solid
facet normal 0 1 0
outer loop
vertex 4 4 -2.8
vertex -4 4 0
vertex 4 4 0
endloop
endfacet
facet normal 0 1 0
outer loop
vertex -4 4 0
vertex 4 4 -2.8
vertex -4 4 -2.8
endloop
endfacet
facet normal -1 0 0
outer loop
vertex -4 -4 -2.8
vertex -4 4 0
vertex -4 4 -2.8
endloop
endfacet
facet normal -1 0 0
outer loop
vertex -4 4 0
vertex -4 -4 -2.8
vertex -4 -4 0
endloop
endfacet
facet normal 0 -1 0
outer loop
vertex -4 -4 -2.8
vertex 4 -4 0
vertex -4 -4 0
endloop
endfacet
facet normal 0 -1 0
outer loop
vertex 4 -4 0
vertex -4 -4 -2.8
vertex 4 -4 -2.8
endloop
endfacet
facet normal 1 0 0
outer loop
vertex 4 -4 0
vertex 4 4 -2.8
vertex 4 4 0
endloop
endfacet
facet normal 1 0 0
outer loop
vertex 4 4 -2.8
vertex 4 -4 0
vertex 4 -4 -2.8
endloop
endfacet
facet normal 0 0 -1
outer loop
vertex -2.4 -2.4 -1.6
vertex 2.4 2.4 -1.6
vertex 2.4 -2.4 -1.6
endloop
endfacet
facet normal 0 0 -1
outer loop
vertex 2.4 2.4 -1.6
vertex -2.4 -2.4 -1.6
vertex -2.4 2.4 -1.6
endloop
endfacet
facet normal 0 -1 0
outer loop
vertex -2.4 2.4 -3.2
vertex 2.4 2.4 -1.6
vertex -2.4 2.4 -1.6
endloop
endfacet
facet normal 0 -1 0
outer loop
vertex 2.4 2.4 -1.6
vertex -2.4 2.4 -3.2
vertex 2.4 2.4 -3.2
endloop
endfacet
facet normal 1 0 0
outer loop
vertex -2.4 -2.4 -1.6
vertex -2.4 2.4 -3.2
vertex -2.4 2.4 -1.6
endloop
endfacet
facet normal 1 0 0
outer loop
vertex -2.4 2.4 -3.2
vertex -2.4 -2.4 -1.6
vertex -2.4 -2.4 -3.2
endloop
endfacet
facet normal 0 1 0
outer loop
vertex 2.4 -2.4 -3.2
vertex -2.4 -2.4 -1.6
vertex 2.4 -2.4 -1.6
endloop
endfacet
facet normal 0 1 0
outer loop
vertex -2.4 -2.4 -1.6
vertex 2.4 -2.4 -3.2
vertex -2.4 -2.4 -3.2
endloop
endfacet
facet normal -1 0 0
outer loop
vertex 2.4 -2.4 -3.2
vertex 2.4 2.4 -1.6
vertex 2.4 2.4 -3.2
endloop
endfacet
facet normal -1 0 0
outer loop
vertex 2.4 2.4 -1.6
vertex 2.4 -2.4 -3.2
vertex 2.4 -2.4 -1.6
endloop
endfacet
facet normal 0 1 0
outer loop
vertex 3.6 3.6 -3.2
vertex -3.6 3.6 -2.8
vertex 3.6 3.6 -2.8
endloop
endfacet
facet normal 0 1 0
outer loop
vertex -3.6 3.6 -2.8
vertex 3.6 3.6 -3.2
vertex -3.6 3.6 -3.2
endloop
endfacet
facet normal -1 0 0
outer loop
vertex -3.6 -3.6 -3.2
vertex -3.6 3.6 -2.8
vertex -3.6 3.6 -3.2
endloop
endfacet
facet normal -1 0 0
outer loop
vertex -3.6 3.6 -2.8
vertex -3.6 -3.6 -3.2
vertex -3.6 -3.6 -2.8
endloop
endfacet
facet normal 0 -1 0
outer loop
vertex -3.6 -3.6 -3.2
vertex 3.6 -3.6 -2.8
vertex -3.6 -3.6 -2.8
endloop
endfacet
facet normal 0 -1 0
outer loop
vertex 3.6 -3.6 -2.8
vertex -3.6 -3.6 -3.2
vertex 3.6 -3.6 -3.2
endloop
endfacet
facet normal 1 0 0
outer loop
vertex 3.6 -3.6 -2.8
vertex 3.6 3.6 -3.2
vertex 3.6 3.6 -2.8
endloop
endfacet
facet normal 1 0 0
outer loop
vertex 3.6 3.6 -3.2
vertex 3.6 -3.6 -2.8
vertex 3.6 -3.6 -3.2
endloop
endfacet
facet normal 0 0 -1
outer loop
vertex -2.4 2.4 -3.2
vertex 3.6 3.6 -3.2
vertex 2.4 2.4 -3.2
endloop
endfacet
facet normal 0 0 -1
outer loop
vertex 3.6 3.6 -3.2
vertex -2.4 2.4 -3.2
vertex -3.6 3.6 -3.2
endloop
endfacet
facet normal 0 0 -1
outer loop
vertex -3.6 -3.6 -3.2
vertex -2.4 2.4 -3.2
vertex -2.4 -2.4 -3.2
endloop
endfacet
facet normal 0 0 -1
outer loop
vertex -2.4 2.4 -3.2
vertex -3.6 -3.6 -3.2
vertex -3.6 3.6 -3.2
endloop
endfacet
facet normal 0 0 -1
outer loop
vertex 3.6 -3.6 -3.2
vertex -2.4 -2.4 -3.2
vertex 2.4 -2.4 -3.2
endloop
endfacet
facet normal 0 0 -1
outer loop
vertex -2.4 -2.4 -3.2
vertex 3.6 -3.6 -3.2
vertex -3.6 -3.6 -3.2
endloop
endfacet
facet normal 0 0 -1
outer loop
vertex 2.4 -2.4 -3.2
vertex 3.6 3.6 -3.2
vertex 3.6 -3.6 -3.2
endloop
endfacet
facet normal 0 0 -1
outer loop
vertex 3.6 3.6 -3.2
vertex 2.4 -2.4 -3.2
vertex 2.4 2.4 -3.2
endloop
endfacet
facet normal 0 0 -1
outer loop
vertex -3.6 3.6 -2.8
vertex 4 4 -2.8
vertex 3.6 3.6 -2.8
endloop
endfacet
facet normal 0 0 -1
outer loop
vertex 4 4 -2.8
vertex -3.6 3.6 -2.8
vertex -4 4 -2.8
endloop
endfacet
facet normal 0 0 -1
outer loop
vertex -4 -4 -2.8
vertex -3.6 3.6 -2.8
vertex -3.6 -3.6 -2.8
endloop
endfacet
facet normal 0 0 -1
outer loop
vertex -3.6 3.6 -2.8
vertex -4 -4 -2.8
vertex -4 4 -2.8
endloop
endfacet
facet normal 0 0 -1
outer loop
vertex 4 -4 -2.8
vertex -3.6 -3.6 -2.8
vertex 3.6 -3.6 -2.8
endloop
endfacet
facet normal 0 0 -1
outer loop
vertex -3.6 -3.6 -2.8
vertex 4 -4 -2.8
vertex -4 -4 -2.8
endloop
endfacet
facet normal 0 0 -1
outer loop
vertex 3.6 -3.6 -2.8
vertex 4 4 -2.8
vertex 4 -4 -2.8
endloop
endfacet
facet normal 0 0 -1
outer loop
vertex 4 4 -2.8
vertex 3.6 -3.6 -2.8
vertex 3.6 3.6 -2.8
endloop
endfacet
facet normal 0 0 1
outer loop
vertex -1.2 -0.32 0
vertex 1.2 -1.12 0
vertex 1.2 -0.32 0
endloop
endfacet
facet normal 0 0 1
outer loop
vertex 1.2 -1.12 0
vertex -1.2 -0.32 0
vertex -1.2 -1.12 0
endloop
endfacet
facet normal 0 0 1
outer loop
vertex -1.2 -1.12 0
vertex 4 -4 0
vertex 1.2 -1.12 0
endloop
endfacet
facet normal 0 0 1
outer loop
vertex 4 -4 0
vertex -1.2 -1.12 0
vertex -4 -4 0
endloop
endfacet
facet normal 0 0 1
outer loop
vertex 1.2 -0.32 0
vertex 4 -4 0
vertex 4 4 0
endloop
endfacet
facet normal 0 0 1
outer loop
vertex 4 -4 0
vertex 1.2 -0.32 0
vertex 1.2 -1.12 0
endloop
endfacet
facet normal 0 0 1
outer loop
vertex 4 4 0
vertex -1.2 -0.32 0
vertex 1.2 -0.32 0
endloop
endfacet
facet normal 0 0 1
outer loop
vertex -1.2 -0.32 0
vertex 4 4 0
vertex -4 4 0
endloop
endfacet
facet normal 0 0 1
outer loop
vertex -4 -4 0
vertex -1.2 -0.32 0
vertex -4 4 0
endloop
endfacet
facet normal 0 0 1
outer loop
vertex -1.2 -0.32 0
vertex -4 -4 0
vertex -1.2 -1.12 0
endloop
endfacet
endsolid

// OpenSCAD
// file: ../p/box5.scad
use <../lib.scad>
function ldraw_lib__box5() = [
// 0 Box with 5 Faces and All Edges
// 0 Name: box5.dat
// 0 Author: James Jessiman
// 0 !LDRAW_ORG Primitive UPDATE 2012-01
// 0 !LICENSE Licensed under CC BY 2.0 and CC BY 4.0 : see CAreadme.txt
// 
// 0 BFC CERTIFY CCW
  [0,"BFC","CERTIFY"],
  [0,"BFC","CCW"],
// 
// 0 !HISTORY 2002-04-03 [sbliss] Modified for BFC compliance
// 0 !HISTORY 2002-04-25 [PTadmin] Official Update 2002-02
// 0 !HISTORY 2007-06-24 [PTadmin] Header formatted for Contributor Agreement
// 0 !HISTORY 2008-07-01 [PTadmin] Official Update 2008-01
// 0 !HISTORY 2012-02-16 [Philo] Changed to CCW
// 0 !HISTORY 2012-03-30 [PTadmin] Official Update 2012-01
// 
// 
// 2 24 1 1 1 -1 1 1
  [2,24,1,1,1,-1,1,1],
// 2 24 -1 1 1 -1 1 -1
  [2,24,-1,1,1,-1,1,-1],
// 2 24 -1 1 -1 1 1 -1
  [2,24,-1,1,-1,1,1,-1],
// 2 24 1 1 -1 1 1 1
  [2,24,1,1,-1,1,1,1],
// 2 24 1 0 1 -1 0 1
  [2,24,1,0,1,-1,0,1],
// 2 24 -1 0 1 -1 0 -1
  [2,24,-1,0,1,-1,0,-1],
// 2 24 -1 0 -1 1 0 -1
  [2,24,-1,0,-1,1,0,-1],
// 2 24 1 0 -1 1 0 1
  [2,24,1,0,-1,1,0,1],
// 2 24 1 0 1 1 1 1
  [2,24,1,0,1,1,1,1],
// 2 24 -1 0 1 -1 1 1
  [2,24,-1,0,1,-1,1,1],
// 2 24 1 0 -1 1 1 -1
  [2,24,1,0,-1,1,1,-1],
// 2 24 -1 0 -1 -1 1 -1
  [2,24,-1,0,-1,-1,1,-1],
// 4 16 -1 1 1 1 1 1 1 1 -1 -1 1 -1
  [4,16,-1,1,1,1,1,1,1,1,-1,-1,1,-1],
// 4 16 -1 1 1 -1 0 1 1 0 1 1 1 1
  [4,16,-1,1,1,-1,0,1,1,0,1,1,1,1],
// 4 16 -1 1 -1 -1 0 -1 -1 0 1 -1 1 1
  [4,16,-1,1,-1,-1,0,-1,-1,0,1,-1,1,1],
// 4 16 1 1 -1 1 0 -1 -1 0 -1 -1 1 -1
  [4,16,1,1,-1,1,0,-1,-1,0,-1,-1,1,-1],
// 4 16 1 1 1 1 0 1 1 0 -1 1 1 -1
  [4,16,1,1,1,1,0,1,1,0,-1,1,1,-1],
];
makepoly(ldraw_lib__box5(), line=0.2);
// file: ../p/box4.scad
use <../lib.scad>
function ldraw_lib__box4() = [
// 0 Box with 4 Faces (2 Parallel Pairs) and All Edges
// 0 Name: box4.dat
// 0 Author: James Jessiman
// 0 !LDRAW_ORG Primitive UPDATE 2012-01
// 0 !LICENSE Licensed under CC BY 2.0 and CC BY 4.0 : see CAreadme.txt
// 
// 0 BFC CERTIFY CCW
  [0,"BFC","CERTIFY"],
  [0,"BFC","CCW"],
// 
// 0 !HISTORY 2002-04-03 [sbliss] Modified for BFC compliance
// 0 !HISTORY 2002-04-25 [PTadmin] Official Update 2002-02
// 0 !HISTORY 2007-06-24 [PTadmin] Header formatted for Contributor Agreement
// 0 !HISTORY 2008-07-01 [PTadmin] Official Update 2008-01
// 0 !HISTORY 2012-02-16 [Philo] Changed to CCW
// 0 !HISTORY 2012-03-30 [PTadmin] Official Update 2012-01
// 
// 
// 2 24 1 1 1 -1 1 1
  [2,24,1,1,1,-1,1,1],
// 2 24 -1 1 1 -1 1 -1
  [2,24,-1,1,1,-1,1,-1],
// 2 24 -1 1 -1 1 1 -1
  [2,24,-1,1,-1,1,1,-1],
// 2 24 1 1 -1 1 1 1
  [2,24,1,1,-1,1,1,1],
// 2 24 1 0 1 -1 0 1
  [2,24,1,0,1,-1,0,1],
// 2 24 -1 0 1 -1 0 -1
  [2,24,-1,0,1,-1,0,-1],
// 2 24 -1 0 -1 1 0 -1
  [2,24,-1,0,-1,1,0,-1],
// 2 24 1 0 -1 1 0 1
  [2,24,1,0,-1,1,0,1],
// 2 24 1 0 1 1 1 1
  [2,24,1,0,1,1,1,1],
// 2 24 -1 0 1 -1 1 1
  [2,24,-1,0,1,-1,1,1],
// 2 24 1 0 -1 1 1 -1
  [2,24,1,0,-1,1,1,-1],
// 2 24 -1 0 -1 -1 1 -1
  [2,24,-1,0,-1,-1,1,-1],
// 4 16 -1 1 1 -1 0 1 1 0 1 1 1 1
  [4,16,-1,1,1,-1,0,1,1,0,1,1,1,1],
// 4 16 -1 1 -1 -1 0 -1 -1 0 1 -1 1 1
  [4,16,-1,1,-1,-1,0,-1,-1,0,1,-1,1,1],
// 4 16 1 1 -1 1 0 -1 -1 0 -1 -1 1 -1
  [4,16,1,1,-1,1,0,-1,-1,0,-1,-1,1,-1],
// 4 16 1 1 1 1 0 1 1 0 -1 1 1 -1
  [4,16,1,1,1,1,0,1,1,0,-1,1,1,-1],
];
makepoly(ldraw_lib__box4(), line=0.2);
// file: s/3070bs01.scad
use <../../lib.scad>
use <../../p/box4.scad>
use <../../p/box5.scad>
function ldraw_lib__s__3070bs01() = [
// 0 ~Tile  1 x  1 with Groove without Top Face
// 0 Name: s\3070bs01.dat
// 0 Author: Chris Dee [cwdee]
// 0 !LDRAW_ORG Subpart UPDATE 2009-02
// 0 !LICENSE Licensed under CC BY 2.0 and CC BY 4.0 : see CAreadme.txt
// 
// 0 BFC CERTIFY CCW
  [0,"BFC","CERTIFY"],
  [0,"BFC","CCW"],
// 
// 0 !HISTORY 2009-09-03 [PTadmin] Official Update 2009-02
// 
// 
// 1 16 0 0 0 10 0 0 0 7 0 0 0 10 box4.dat
  [1,16,0,0,0,10,0,0,0,7,0,0,0,10, ldraw_lib__box4()],
// 0 BFC INVERTNEXT
  [0,"BFC","INVERTNEXT"],
// 1 16 0 8 0 6 0 0 0 -4 0 0 0 6 box5.dat
  [1,16,0,8,0,6,0,0,0,-4,0,0,0,6, ldraw_lib__box5()],
// 1 16 0 7 0 9 0 0 0 1 0 0 0 9 box4.dat
  [1,16,0,7,0,9,0,0,0,1,0,0,0,9, ldraw_lib__box4()],
// 
// 4 16 9 8 9 6 8 6 -6 8 6 -9 8 9
  [4,16,9,8,9,6,8,6,-6,8,6,-9,8,9],
// 4 16 -9 8 9 -6 8 6 -6 8 -6 -9 8 -9
  [4,16,-9,8,9,-6,8,6,-6,8,-6,-9,8,-9],
// 4 16 -9 8 -9 -6 8 -6 6 8 -6 9 8 -9
  [4,16,-9,8,-9,-6,8,-6,6,8,-6,9,8,-9],
// 4 16 9 8 -9 6 8 -6 6 8 6 9 8 9
  [4,16,9,8,-9,6,8,-6,6,8,6,9,8,9],
// 
// 4 16 10 7 10 9 7 9 -9 7 9 -10 7 10
  [4,16,10,7,10,9,7,9,-9,7,9,-10,7,10],
// 4 16 -10 7 10 -9 7 9 -9 7 -9 -10 7 -10
  [4,16,-10,7,10,-9,7,9,-9,7,-9,-10,7,-10],
// 4 16 -10 7 -10 -9 7 -9 9 7 -9 10 7 -10
  [4,16,-10,7,-10,-9,7,-9,9,7,-9,10,7,-10],
// 4 16 10 7 -10 9 7 -9 9 7 9 10 7 10
  [4,16,10,7,-10,9,7,-9,9,7,9,10,7,10],
// 0
];
makepoly(ldraw_lib__s__3070bs01(), line=0.2);
// main file
use <../lib.scad>
use <s/3070bs01.scad>
function ldraw_lib__3070bpuh() = [
// 0 Tile  1 x  1 with Silver "-" Pattern
// 0 Name: 3070bpuh.dat
// 0 Author: Magnus Forsberg [MagFors]
// 0 !LDRAW_ORG Part UPDATE 2015-02
// 0 !LICENSE Licensed under CC BY 2.0 and CC BY 4.0 : see CAreadme.txt
// 
// 0 BFC CERTIFY CCW
  [0,"BFC","CERTIFY"],
  [0,"BFC","CCW"],
// 
// 0 !KEYWORDS dash
// 
// 0 !HISTORY 2015-12-30 [PTadmin] Official Update 2015-02
// 
// 
// 1 16 0 0 0 1 0 0 0 1 0 0 0 1 s\3070bs01.dat
  [1,16,0,0,0,1,0,0,0,1,0,0,0,1, ldraw_lib__s__3070bs01()],
// 
// 4 80 3 0 -0.8 -3 0 -0.8 -3 0 -2.8 3 0 -2.8
  [4,80,3,0,-0.8,-3,0,-0.8,-3,0,-2.8,3,0,-2.8],
// 
// 4 16 -3 0 -2.8 -10 0 -10 10 0 -10 3 0 -2.8
  [4,16,-3,0,-2.8,-10,0,-10,10,0,-10,3,0,-2.8],
// 4 16 3 0 -0.8 3 0 -2.8 10 0 -10 10 0 10
  [4,16,3,0,-0.8,3,0,-2.8,10,0,-10,10,0,10],
// 4 16 -10 0 10 -3 0 -0.8 3 0 -0.8 10 0 10
  [4,16,-10,0,10,-3,0,-0.8,3,0,-0.8,10,0,10],
// 4 16 -10 0 -10 -3 0 -2.8 -3 0 -0.8 -10 0 10
  [4,16,-10,0,-10,-3,0,-2.8,-3,0,-0.8,-10,0,10],
];
makepoly(ldraw_lib__3070bpuh(), line=0.2);
